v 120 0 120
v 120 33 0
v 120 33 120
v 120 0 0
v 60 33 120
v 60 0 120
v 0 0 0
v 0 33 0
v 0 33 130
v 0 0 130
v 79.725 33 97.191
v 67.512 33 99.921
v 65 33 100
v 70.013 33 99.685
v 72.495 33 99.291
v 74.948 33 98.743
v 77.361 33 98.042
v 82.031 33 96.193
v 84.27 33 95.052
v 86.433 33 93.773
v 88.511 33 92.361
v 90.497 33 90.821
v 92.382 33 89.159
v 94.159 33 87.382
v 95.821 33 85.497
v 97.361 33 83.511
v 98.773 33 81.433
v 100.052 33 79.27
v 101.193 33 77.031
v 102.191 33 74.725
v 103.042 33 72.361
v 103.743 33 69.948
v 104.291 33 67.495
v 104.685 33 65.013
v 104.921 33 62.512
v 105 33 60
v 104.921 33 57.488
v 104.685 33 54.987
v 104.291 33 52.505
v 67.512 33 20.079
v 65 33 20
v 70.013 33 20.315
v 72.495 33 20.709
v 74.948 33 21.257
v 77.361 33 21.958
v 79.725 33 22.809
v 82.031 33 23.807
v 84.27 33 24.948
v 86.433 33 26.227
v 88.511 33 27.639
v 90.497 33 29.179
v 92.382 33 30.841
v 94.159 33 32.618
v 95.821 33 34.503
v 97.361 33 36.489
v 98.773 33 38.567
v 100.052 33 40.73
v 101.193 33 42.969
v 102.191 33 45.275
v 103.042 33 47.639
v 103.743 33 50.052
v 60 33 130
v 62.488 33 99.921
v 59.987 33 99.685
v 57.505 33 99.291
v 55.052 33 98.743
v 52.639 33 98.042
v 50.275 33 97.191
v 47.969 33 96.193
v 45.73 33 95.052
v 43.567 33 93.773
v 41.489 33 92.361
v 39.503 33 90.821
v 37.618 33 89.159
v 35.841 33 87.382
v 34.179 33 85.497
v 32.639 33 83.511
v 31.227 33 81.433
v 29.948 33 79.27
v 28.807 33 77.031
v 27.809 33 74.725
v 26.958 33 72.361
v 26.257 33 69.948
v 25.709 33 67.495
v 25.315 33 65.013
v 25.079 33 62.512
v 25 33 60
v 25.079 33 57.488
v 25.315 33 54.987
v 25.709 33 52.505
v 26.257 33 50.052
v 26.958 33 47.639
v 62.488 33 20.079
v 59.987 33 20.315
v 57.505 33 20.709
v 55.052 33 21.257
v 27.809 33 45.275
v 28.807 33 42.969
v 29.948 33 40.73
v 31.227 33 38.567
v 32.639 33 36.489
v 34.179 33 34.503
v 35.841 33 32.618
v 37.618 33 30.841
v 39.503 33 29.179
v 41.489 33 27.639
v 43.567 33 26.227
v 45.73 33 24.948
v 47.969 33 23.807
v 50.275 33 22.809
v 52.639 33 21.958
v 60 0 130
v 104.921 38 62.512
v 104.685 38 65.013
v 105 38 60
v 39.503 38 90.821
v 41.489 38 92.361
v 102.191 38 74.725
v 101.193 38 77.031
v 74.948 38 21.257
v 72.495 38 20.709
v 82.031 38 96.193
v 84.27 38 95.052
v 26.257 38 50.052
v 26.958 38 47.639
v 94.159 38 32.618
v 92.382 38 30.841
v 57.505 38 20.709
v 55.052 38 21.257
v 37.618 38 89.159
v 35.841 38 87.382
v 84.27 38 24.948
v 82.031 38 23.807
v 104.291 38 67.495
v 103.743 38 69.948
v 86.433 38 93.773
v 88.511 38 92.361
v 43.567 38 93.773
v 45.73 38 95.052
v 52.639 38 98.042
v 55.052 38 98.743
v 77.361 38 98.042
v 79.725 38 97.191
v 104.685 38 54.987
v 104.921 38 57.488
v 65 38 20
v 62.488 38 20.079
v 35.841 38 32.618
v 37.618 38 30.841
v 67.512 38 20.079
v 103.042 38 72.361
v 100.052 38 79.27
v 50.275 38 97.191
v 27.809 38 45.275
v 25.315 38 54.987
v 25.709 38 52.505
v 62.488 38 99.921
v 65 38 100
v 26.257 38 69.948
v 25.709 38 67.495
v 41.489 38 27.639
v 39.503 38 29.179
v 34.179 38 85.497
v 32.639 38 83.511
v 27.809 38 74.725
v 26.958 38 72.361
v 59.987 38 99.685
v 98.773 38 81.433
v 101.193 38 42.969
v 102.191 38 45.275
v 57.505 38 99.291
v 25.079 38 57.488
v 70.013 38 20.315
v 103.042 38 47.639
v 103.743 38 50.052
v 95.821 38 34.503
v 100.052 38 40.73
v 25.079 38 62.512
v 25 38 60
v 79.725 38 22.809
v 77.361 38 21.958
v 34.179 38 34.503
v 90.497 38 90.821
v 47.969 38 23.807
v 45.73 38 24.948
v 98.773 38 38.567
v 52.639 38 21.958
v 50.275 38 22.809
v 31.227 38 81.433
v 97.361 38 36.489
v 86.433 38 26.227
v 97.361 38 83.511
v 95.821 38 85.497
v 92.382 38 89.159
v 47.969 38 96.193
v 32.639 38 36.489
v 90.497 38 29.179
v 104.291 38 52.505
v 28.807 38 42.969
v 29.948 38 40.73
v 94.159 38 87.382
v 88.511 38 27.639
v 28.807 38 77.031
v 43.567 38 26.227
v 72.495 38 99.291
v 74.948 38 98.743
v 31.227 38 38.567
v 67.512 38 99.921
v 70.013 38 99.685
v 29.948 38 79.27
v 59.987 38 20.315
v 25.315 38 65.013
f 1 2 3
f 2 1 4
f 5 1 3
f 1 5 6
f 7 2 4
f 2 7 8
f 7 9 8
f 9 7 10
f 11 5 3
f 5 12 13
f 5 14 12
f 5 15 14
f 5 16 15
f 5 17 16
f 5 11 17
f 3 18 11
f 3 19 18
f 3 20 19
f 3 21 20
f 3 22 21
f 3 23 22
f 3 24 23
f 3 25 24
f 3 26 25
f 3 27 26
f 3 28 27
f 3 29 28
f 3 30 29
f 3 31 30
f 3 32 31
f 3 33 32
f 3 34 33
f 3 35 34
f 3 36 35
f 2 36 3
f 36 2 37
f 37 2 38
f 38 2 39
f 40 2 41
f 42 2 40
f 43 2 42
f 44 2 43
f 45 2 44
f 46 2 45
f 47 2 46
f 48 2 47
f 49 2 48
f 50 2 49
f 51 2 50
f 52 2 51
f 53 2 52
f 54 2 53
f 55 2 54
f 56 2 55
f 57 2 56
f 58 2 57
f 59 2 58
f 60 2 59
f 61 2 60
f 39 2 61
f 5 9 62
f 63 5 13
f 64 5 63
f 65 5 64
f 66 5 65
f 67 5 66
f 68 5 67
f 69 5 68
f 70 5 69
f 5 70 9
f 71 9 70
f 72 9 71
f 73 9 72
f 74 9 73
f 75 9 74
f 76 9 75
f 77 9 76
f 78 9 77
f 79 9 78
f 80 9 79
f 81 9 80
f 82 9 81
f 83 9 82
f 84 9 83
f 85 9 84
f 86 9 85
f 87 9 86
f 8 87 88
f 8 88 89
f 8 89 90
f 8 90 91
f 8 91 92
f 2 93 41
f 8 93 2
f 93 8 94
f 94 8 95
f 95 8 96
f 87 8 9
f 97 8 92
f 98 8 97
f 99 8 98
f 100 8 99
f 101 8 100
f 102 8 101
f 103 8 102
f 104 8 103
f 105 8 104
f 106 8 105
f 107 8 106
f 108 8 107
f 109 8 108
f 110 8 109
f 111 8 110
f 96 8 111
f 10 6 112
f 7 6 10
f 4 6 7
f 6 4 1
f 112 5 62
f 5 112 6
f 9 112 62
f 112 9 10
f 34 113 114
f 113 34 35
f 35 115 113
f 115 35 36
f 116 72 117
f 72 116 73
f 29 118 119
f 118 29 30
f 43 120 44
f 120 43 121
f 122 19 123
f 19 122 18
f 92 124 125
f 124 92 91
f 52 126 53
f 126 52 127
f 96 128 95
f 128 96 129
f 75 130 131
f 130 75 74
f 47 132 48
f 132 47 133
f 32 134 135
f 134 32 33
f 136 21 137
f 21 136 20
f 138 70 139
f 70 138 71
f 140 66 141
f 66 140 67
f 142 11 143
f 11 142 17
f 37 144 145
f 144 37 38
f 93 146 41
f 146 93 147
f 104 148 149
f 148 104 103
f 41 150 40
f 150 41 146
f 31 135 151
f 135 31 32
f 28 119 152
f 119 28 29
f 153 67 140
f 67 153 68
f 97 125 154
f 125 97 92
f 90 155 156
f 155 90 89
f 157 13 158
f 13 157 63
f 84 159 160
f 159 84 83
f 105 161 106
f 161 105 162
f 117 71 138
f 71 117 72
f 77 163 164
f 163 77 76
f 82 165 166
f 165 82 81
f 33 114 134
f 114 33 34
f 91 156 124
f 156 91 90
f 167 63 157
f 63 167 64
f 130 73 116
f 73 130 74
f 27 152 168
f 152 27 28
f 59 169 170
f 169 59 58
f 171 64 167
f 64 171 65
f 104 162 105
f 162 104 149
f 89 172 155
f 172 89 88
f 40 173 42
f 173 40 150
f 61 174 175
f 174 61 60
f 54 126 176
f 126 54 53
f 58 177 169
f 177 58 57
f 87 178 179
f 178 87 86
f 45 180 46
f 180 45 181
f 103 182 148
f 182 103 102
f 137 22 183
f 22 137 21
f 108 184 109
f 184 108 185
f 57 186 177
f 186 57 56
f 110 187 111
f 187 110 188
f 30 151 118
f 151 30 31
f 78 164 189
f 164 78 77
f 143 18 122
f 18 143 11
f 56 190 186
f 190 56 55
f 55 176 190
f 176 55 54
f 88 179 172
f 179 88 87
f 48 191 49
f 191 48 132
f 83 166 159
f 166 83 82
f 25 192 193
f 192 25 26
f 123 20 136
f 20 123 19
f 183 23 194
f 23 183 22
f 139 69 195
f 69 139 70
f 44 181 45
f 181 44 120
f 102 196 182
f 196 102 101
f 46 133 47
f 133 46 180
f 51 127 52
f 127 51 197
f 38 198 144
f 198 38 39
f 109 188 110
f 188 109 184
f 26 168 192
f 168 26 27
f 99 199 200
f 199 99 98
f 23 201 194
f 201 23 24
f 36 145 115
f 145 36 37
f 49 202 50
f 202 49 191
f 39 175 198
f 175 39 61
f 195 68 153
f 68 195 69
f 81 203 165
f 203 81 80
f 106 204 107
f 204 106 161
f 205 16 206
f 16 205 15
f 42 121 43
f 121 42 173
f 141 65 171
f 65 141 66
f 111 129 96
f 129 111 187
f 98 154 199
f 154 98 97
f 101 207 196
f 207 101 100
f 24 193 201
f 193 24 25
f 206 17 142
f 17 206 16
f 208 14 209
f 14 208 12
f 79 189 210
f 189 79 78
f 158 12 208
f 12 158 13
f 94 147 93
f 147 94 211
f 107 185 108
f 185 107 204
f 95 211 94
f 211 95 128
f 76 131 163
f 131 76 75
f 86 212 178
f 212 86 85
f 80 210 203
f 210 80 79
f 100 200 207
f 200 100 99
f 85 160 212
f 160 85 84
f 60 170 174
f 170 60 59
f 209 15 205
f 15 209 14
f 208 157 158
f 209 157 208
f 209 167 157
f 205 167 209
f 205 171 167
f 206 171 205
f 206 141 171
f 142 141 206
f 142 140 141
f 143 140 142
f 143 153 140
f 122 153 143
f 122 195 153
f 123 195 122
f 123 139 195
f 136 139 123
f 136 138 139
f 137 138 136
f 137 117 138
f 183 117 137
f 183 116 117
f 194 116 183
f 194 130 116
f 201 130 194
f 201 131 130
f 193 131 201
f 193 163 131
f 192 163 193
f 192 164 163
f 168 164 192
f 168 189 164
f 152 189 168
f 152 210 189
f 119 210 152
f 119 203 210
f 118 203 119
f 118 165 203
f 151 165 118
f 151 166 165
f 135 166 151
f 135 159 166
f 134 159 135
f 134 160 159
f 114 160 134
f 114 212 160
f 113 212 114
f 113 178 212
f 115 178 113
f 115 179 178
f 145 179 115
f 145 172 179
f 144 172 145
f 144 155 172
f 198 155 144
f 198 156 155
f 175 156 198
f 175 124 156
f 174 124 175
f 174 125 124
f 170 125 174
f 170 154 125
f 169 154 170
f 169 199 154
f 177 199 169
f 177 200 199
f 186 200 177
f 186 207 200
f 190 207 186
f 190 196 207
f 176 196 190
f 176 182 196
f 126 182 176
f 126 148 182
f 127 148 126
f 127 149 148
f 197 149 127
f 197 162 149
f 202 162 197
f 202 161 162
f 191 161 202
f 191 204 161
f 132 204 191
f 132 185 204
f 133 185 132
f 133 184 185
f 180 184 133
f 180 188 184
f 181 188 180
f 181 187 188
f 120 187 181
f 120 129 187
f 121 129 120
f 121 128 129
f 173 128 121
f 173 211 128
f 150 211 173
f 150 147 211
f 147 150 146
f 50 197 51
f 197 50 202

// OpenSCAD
$fn=100;
module fan_hole(depth=5, padding_radius=0) {

  color([0,1,1])
    rotate([90,0,0])
    cylinder(h=depth, r=40 + padding_radius);
}

module exhaust(depth=2, height=10) {
  difference() {
    cube([60,33,height]);

    translate([depth,depth,0]) {
      cube([60 - depth * 2,33 - depth * 2,height]);
    }
  }
}
module fan() {
  cube([120, 33, 120]);

  translate([0,0, 120]) {
    cube([60,33,10]);
  }
  translate([65,38,60]) {
    color([1,0,0])
    fan_hole();
  }
}

fan();
